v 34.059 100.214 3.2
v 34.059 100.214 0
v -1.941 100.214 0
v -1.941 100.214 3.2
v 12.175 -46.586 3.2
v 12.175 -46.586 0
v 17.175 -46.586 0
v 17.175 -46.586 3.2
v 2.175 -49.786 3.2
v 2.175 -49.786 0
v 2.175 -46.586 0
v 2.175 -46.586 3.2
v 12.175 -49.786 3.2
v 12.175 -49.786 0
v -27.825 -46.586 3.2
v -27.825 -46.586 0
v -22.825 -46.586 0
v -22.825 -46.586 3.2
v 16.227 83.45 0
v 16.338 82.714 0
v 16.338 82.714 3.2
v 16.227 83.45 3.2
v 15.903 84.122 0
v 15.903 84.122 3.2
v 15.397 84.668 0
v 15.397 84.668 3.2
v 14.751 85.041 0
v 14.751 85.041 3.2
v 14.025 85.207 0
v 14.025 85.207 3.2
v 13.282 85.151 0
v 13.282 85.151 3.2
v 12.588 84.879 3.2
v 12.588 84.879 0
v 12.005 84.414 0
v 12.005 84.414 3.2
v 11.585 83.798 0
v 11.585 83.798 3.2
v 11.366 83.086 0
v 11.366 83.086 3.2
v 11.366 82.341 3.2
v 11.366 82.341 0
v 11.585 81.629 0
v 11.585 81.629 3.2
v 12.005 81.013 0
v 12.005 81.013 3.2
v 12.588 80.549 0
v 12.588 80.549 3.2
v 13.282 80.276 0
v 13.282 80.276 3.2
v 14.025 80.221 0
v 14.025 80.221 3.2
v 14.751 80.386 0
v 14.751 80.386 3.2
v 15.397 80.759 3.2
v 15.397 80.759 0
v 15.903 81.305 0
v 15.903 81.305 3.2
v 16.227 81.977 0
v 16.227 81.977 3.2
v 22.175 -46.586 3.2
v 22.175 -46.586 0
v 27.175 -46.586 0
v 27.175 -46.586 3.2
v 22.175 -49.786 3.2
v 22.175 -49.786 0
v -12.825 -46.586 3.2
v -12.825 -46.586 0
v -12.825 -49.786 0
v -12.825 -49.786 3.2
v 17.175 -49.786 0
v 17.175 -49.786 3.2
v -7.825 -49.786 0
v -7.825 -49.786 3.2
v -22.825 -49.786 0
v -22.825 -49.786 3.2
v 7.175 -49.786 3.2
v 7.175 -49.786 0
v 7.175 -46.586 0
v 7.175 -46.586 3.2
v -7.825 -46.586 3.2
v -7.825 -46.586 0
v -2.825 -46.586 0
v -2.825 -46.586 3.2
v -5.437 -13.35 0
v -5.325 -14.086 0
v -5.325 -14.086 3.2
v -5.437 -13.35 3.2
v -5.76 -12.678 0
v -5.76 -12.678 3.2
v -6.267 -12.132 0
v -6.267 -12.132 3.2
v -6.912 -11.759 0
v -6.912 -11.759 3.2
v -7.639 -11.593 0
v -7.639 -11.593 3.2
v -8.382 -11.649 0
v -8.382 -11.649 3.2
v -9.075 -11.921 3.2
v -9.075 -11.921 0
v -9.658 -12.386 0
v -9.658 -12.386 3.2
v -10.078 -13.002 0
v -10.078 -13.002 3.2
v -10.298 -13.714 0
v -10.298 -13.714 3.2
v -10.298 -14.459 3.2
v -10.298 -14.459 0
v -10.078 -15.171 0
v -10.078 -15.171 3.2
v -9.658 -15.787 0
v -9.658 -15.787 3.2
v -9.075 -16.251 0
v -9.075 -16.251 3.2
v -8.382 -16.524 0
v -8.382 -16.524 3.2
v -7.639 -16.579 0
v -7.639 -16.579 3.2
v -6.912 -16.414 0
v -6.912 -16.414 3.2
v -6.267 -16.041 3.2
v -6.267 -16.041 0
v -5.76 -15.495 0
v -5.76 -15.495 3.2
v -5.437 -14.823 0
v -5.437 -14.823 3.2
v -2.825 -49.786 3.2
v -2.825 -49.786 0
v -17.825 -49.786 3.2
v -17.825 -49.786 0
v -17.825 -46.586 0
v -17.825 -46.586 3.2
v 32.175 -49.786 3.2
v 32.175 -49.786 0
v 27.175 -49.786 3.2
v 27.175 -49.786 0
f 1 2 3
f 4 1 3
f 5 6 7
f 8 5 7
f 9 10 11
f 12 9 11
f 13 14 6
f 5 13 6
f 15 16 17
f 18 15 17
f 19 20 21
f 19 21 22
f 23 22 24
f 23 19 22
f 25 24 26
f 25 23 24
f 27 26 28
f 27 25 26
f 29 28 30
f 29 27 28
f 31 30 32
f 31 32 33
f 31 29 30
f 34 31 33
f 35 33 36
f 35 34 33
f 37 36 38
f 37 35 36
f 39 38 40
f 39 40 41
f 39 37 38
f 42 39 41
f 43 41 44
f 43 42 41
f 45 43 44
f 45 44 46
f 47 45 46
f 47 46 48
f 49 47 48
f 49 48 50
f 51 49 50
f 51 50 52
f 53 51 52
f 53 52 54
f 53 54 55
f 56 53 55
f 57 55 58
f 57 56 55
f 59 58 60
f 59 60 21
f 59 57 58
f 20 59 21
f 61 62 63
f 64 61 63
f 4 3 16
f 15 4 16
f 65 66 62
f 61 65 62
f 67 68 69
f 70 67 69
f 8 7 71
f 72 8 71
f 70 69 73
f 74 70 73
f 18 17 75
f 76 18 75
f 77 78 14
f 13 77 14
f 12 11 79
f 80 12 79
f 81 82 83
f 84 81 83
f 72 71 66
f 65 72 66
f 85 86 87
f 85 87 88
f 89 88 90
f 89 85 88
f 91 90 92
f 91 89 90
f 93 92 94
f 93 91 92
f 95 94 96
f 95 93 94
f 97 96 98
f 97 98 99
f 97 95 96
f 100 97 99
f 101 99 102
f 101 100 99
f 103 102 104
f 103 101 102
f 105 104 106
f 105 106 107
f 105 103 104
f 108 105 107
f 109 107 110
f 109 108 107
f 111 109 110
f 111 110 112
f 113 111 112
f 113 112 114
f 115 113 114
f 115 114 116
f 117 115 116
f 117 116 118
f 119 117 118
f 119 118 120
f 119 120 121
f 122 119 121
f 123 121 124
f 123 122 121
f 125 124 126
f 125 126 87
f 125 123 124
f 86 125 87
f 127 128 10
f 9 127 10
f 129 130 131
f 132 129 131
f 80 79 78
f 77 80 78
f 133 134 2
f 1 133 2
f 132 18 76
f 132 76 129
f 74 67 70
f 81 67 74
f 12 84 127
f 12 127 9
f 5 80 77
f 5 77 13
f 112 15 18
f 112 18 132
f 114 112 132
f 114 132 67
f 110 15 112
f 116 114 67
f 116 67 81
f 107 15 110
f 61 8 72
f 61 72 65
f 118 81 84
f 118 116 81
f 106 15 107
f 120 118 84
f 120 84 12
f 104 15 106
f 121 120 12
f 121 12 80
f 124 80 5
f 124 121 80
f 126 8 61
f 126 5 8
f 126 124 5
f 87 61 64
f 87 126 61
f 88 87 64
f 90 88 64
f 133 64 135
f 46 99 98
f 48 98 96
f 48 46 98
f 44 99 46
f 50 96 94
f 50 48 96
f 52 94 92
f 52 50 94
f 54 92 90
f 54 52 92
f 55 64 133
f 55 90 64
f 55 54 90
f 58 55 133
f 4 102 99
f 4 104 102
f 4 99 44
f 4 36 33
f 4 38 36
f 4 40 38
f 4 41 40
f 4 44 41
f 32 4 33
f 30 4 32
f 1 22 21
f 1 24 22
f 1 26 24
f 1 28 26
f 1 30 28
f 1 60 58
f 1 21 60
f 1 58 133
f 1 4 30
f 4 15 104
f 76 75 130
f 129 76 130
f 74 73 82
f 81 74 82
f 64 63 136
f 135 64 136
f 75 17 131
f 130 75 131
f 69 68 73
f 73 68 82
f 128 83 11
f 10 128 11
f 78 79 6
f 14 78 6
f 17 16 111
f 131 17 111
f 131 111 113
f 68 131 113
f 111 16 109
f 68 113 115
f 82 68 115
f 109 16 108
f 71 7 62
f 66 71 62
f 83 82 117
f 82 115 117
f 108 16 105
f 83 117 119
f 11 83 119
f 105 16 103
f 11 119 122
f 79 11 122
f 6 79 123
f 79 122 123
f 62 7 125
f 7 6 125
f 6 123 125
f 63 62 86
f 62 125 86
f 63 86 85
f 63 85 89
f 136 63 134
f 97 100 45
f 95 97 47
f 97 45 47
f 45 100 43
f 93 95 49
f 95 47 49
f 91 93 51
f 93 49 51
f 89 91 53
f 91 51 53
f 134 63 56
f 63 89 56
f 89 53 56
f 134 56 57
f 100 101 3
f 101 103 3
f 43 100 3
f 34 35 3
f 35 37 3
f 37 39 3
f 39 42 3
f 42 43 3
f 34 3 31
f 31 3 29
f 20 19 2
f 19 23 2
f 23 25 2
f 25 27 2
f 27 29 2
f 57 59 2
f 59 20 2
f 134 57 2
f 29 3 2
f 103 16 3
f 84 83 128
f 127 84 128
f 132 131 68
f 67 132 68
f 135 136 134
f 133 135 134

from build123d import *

# Parameters (mm, degrees)
F0_R     = 2.5
F1_DEPTH = 3.2


with BuildPart() as f1:
    # F0 (on Top) → F1 (new body)
    with BuildSketch(Plane.XY):
        Polygon((34.059358, 100.213571), (-1.940642, 100.213571), (-27.825443, -46.586429), (-22.825443, -46.586429), (-22.825443, -49.786429), (-17.825443, -49.786429), (-17.825443, -46.586429), (-12.825443, -46.586429), (-12.825443, -49.786429), (-7.825443, -49.786429), (-7.825443, -46.586429), (-2.825443, -46.586429), (-2.825443, -49.786429), (2.174557, -49.786429), (2.174557, -46.586429), (7.174557, -46.586429), (7.174557, -49.786429), (12.174557, -49.786429), (12.174557, -46.586429), (17.174557, -46.586429), (17.174557, -49.786429), (22.174557, -49.786429), (22.174557, -46.586429), (27.174557, -46.586429), (27.174557, -49.786429), (32.174557, -49.786429), align=None)
        with Locations((-7.825443, -14.086429)):
            Circle(F0_R, mode=Mode.SUBTRACT)
        with Locations((13.837886, 82.713571)):
            Circle(F0_R, mode=Mode.SUBTRACT)
    extrude(amount=F1_DEPTH)


solid = f1.part
